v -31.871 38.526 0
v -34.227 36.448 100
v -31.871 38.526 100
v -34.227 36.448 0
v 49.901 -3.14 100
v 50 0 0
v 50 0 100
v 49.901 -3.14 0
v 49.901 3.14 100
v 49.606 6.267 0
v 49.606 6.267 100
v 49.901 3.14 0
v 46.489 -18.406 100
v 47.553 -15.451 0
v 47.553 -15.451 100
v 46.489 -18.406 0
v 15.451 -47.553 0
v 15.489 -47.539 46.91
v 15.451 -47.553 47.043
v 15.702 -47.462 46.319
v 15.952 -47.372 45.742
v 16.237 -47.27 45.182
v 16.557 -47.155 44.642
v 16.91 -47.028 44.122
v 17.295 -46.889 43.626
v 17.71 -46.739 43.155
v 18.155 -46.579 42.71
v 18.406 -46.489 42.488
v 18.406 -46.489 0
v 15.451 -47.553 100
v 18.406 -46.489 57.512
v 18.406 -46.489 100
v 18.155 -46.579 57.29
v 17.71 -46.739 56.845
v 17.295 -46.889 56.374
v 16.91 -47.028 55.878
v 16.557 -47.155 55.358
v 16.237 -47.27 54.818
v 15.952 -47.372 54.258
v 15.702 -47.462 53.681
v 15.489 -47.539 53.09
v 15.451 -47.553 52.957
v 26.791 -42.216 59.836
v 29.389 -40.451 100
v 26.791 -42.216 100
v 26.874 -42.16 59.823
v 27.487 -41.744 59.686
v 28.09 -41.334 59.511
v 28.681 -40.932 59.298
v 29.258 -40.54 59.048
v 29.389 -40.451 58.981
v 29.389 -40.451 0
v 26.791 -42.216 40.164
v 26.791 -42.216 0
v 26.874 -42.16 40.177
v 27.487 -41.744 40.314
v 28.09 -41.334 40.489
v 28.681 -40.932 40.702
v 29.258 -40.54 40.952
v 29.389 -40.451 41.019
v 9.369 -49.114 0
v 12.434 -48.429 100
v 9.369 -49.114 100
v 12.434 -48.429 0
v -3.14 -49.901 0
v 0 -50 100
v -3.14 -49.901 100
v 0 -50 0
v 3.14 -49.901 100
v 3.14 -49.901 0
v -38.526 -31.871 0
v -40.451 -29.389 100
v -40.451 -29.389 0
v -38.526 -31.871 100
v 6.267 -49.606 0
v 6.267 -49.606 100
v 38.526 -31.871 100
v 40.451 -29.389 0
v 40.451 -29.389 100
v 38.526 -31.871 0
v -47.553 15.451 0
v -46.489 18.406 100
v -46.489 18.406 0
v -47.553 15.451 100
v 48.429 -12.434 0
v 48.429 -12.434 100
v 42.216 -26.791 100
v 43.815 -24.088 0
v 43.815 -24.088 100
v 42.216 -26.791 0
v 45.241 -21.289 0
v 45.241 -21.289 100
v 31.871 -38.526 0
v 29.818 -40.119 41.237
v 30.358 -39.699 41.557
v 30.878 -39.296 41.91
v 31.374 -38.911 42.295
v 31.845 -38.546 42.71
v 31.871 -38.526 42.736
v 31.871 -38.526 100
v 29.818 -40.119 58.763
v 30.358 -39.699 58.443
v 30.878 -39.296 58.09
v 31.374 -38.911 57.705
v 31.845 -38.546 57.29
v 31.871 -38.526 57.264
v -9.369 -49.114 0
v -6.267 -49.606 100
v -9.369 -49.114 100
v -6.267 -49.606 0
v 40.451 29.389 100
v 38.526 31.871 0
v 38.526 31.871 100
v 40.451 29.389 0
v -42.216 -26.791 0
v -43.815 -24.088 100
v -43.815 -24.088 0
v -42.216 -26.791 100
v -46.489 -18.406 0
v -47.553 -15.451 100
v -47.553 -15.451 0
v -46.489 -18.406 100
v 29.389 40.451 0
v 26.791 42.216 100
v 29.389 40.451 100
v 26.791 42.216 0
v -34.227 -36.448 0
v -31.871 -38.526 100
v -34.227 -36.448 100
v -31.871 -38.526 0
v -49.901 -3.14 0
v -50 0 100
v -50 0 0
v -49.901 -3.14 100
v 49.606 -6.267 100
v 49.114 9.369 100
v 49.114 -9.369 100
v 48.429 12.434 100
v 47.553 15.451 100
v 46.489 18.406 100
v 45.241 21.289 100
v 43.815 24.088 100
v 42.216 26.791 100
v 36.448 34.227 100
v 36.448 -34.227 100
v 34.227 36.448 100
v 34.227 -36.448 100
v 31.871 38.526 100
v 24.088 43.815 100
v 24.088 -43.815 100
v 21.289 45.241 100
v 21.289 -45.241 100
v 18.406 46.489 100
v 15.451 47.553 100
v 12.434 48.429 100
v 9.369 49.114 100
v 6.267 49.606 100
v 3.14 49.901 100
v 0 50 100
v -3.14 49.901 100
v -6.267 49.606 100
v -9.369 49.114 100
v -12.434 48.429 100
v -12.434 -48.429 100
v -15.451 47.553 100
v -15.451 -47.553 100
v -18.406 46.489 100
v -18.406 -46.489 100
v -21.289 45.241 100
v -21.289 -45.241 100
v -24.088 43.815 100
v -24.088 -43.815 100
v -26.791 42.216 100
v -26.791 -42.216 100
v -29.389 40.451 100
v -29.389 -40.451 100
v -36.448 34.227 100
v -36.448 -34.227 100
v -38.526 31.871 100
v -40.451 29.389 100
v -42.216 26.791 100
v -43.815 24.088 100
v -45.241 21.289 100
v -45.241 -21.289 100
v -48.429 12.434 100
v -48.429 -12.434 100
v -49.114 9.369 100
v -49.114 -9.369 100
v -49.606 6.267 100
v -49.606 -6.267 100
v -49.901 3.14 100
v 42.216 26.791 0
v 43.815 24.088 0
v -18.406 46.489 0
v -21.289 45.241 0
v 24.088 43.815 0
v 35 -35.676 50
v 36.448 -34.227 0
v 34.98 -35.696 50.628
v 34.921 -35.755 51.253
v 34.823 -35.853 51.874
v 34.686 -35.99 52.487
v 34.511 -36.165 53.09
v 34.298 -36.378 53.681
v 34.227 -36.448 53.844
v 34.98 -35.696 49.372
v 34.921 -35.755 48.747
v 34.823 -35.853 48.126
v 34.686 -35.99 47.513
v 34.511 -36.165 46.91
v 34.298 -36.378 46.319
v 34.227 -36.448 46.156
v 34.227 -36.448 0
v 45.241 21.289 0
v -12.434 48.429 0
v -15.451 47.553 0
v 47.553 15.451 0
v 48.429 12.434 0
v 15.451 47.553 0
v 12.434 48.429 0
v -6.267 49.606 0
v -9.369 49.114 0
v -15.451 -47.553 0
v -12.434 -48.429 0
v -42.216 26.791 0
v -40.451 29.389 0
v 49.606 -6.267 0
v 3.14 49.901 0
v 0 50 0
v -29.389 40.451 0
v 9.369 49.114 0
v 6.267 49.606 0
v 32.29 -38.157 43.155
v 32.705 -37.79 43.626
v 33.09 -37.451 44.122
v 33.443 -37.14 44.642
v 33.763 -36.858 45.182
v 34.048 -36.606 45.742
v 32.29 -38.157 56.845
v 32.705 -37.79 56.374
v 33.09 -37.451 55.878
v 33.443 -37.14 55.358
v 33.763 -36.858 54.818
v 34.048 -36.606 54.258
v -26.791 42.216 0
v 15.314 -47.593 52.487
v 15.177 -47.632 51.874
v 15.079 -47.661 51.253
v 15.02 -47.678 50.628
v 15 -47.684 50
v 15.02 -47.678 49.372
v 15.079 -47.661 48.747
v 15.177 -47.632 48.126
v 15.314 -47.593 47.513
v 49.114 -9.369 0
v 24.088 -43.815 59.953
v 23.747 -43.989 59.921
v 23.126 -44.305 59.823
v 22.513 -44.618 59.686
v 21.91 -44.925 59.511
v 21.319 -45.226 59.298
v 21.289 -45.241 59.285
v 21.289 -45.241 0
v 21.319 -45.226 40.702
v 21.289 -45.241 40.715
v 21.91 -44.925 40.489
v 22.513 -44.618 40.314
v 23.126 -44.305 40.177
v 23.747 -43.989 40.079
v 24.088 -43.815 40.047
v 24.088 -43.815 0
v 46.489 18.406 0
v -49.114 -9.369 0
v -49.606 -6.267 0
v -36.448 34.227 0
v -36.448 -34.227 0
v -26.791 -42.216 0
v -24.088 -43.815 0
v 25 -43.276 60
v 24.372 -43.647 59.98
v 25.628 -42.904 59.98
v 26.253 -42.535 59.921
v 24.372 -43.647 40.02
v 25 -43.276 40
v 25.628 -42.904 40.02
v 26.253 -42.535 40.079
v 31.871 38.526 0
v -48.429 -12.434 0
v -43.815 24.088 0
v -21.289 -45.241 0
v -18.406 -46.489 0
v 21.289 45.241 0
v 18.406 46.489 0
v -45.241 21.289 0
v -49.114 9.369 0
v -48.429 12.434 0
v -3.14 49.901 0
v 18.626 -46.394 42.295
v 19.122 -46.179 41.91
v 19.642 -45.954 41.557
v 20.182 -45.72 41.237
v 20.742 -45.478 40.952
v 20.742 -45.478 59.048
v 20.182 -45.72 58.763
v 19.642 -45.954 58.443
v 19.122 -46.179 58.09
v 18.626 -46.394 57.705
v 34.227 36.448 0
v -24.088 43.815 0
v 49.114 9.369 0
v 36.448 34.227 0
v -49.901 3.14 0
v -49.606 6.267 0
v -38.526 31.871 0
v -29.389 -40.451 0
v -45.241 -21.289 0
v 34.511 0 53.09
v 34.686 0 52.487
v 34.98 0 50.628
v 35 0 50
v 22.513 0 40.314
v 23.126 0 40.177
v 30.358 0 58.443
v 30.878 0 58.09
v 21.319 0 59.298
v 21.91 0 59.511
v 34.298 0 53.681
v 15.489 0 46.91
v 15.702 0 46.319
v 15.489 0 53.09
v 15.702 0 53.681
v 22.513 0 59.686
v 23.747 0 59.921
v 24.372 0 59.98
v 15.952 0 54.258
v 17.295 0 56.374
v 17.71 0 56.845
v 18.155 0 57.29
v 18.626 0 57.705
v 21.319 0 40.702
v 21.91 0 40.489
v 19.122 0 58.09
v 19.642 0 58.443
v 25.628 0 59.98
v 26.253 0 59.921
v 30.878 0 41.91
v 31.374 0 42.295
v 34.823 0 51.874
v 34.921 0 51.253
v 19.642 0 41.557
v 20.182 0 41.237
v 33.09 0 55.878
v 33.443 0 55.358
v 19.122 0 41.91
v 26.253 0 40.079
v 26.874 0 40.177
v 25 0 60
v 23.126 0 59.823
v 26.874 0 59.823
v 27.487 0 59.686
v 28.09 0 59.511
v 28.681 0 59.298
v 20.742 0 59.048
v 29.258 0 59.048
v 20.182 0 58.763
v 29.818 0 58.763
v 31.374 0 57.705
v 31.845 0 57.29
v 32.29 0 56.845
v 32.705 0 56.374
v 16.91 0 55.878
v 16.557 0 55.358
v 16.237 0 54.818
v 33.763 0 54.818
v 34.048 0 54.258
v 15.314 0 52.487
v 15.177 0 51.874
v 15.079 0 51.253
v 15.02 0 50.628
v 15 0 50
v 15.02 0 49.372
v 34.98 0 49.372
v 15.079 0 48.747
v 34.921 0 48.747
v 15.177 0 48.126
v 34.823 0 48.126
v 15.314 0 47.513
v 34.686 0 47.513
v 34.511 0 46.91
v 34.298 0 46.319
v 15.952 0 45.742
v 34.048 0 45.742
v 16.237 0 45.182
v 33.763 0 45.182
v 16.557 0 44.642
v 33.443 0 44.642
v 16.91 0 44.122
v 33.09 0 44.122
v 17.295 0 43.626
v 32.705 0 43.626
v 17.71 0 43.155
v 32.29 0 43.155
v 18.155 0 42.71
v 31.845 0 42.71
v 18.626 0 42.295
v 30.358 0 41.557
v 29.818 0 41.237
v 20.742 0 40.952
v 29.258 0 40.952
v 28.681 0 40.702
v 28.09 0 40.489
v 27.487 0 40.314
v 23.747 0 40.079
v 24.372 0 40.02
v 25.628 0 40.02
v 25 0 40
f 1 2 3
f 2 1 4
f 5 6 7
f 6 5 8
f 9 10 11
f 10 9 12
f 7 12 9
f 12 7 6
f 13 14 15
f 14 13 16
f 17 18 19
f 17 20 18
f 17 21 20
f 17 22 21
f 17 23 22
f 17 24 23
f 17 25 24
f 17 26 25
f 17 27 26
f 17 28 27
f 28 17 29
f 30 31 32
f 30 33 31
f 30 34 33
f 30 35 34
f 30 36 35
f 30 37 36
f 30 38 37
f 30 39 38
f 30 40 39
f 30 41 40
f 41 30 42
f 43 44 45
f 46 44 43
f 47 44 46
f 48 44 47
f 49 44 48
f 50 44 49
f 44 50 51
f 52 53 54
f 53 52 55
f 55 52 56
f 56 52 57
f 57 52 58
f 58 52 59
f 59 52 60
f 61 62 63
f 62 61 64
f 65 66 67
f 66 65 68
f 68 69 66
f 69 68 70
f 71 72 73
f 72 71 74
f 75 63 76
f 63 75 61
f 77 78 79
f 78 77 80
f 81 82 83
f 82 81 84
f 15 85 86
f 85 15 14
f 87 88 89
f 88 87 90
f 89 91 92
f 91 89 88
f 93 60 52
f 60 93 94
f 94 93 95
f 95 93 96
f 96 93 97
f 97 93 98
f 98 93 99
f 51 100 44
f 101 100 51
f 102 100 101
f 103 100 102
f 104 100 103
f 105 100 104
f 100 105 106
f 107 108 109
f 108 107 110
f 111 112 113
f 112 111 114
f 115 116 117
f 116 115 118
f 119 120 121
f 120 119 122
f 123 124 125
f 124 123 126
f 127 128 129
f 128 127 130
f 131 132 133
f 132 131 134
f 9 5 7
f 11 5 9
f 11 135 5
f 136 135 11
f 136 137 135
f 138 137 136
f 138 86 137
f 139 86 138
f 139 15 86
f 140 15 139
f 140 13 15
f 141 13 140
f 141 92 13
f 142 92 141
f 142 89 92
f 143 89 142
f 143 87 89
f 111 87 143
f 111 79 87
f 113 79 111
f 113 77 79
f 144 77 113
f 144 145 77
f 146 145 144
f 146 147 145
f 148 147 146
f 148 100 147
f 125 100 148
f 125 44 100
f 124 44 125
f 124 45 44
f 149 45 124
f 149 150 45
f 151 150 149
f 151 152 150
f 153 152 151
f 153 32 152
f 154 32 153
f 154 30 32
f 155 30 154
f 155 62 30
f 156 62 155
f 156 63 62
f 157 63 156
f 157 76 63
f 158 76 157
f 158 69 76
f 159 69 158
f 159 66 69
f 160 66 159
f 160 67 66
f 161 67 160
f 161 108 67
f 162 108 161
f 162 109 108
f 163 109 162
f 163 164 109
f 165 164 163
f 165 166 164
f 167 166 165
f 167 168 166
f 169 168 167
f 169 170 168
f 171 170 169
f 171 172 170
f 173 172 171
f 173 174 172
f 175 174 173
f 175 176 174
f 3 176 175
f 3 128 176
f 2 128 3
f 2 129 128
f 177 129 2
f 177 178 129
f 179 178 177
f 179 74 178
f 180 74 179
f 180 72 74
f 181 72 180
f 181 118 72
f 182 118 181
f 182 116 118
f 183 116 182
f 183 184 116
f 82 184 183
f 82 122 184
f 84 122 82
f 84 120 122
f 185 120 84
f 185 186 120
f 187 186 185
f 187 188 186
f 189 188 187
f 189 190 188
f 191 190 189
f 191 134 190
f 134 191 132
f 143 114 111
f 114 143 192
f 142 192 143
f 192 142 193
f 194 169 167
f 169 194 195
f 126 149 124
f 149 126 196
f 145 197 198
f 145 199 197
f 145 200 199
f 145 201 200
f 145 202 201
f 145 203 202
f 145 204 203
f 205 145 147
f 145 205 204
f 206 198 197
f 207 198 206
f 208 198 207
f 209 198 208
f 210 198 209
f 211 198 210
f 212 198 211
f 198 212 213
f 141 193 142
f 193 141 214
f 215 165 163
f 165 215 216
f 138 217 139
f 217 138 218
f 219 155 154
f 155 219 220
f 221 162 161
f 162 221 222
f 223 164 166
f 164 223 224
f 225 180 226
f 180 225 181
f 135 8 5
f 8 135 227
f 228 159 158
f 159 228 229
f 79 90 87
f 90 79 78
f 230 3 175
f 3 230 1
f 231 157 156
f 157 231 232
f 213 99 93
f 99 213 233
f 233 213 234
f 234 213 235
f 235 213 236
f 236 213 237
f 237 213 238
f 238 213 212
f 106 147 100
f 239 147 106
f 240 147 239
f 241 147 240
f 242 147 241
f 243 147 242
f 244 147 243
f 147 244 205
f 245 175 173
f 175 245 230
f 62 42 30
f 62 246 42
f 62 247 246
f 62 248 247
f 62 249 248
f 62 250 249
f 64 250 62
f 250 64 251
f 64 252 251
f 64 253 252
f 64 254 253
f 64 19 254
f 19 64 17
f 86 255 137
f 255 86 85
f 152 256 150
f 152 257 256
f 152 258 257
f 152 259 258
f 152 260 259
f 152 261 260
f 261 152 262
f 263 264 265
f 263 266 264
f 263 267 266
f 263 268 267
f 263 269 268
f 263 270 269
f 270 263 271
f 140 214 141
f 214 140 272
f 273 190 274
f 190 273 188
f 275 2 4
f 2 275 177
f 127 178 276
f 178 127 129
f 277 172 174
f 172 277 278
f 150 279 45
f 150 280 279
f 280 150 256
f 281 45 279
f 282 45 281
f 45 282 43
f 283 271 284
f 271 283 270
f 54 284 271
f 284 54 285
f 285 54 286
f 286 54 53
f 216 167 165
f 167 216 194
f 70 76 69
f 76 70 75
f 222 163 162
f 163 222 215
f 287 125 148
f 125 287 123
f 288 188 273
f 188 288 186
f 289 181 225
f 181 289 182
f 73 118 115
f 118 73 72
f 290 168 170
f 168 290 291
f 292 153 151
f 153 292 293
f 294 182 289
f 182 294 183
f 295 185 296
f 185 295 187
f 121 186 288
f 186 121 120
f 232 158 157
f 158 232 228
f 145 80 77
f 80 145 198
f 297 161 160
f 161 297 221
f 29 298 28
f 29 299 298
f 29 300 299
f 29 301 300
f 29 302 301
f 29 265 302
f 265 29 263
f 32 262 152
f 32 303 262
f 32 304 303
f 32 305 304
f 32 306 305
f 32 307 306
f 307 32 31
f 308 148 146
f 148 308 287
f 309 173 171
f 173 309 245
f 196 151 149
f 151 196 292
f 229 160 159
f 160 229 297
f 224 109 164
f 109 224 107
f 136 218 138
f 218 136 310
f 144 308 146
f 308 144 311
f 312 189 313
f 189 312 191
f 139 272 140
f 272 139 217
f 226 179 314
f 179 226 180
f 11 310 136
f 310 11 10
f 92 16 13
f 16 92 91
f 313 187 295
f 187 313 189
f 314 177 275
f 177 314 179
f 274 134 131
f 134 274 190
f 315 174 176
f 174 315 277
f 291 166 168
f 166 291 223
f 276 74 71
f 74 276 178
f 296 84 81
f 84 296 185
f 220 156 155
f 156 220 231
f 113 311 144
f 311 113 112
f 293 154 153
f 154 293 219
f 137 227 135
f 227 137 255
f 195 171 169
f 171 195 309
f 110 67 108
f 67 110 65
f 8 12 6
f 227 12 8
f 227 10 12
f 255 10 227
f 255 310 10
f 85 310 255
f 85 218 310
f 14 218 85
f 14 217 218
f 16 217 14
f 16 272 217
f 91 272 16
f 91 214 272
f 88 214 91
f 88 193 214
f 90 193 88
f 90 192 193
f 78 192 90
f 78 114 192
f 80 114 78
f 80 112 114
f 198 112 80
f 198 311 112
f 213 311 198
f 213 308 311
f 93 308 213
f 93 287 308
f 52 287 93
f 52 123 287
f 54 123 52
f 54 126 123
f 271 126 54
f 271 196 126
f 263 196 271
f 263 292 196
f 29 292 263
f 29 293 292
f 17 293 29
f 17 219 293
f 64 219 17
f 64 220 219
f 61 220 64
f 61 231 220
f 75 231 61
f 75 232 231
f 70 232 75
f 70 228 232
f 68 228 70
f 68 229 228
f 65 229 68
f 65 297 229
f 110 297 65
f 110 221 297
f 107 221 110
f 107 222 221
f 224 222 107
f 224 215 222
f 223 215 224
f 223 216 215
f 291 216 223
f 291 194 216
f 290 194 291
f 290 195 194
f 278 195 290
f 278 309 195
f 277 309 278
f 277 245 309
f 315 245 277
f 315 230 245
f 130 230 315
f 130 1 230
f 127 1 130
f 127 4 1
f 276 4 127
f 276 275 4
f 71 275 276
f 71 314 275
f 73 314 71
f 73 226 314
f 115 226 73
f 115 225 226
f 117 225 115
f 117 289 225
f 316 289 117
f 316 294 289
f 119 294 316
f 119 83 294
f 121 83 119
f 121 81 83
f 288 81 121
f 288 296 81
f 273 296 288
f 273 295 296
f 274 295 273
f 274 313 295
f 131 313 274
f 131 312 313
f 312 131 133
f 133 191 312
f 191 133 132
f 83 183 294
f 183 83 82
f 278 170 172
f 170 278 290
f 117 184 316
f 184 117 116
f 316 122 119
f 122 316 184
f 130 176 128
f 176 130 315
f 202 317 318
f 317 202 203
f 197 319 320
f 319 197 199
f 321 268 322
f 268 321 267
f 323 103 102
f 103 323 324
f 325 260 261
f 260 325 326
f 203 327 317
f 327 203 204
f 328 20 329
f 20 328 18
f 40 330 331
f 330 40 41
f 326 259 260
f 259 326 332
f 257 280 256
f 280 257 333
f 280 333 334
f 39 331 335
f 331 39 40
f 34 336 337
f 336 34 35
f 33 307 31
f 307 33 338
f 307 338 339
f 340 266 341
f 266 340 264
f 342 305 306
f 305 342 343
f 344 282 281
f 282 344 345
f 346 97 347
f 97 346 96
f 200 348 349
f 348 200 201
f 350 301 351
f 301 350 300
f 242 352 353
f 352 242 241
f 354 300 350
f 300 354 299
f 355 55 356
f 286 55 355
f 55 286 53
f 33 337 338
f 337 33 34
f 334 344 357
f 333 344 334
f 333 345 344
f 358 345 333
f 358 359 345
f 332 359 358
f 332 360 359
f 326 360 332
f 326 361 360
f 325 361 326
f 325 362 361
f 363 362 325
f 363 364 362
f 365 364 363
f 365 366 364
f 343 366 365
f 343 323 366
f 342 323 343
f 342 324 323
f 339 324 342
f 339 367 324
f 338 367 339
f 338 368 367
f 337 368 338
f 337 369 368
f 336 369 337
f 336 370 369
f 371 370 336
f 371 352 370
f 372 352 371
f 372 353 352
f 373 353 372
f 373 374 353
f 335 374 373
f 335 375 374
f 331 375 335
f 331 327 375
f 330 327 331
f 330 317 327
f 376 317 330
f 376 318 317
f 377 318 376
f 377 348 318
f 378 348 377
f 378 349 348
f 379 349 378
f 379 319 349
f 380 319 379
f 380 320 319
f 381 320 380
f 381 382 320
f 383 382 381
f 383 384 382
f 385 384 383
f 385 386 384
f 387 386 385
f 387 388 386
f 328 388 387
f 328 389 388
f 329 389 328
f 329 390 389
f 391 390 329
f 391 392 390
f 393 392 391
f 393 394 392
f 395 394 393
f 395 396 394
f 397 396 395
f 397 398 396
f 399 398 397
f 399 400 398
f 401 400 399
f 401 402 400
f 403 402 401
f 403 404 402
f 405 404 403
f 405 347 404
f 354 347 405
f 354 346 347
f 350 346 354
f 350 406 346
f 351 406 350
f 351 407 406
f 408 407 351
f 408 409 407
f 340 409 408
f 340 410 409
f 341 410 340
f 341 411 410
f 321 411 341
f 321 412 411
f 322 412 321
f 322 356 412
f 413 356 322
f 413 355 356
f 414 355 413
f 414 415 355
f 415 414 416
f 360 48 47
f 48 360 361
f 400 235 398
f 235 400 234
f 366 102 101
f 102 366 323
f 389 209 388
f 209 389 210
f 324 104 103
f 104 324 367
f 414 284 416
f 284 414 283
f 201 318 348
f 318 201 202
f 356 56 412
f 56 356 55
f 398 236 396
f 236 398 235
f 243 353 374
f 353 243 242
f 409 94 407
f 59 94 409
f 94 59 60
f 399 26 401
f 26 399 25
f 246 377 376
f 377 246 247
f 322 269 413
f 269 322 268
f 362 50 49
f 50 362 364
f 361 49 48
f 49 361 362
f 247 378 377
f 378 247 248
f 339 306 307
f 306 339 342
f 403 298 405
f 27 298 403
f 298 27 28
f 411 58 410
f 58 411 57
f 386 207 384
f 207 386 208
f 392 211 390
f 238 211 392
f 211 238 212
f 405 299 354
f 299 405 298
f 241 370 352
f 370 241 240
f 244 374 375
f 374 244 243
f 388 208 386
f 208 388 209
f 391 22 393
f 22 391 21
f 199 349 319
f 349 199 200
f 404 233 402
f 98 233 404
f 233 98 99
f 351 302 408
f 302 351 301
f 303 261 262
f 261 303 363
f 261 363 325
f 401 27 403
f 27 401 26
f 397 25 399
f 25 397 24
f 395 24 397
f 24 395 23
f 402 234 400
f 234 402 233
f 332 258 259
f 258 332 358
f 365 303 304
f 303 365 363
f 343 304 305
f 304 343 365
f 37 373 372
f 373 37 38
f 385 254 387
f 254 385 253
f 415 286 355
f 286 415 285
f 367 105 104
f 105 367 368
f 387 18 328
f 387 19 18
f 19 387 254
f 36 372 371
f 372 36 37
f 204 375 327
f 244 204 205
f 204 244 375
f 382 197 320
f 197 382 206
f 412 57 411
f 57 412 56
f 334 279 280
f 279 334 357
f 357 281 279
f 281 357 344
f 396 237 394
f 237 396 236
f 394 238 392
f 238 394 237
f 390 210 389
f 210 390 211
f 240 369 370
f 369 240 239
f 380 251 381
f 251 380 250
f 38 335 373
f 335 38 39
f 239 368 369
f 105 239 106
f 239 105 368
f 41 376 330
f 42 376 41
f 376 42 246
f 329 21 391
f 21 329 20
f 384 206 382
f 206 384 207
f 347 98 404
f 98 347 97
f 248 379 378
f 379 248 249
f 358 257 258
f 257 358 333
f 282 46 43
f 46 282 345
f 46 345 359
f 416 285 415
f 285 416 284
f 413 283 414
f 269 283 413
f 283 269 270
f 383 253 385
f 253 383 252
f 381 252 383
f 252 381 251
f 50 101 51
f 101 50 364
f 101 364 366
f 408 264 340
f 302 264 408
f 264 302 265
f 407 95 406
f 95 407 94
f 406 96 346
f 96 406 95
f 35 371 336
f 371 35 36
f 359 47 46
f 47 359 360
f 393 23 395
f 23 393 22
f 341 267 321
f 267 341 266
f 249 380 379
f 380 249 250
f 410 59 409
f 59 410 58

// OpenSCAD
// Parameters
cylinder_radius = 50;
cylinder_height = 100;
hole_radius = 10;
hole_position_x = 25;  // Adjust position as needed
hole_position_y = 0;
hole_position_z = 50;  // Centered vertically

// Main Cylinder
module main_cylinder() {
    cylinder(h = cylinder_height, r = cylinder_radius, $fn = 100);  // Increased $fn for smoothness
}

// Hole
module hole() {
    translate([hole_position_x, hole_position_y, hole_position_z])
    rotate([90,0,0])
    cylinder(h = cylinder_radius*2, r = hole_radius, $fn = 100);  // Ensure length is enough to pass through
}

// Main difference
difference() {
    main_cylinder();
    hole();
}
